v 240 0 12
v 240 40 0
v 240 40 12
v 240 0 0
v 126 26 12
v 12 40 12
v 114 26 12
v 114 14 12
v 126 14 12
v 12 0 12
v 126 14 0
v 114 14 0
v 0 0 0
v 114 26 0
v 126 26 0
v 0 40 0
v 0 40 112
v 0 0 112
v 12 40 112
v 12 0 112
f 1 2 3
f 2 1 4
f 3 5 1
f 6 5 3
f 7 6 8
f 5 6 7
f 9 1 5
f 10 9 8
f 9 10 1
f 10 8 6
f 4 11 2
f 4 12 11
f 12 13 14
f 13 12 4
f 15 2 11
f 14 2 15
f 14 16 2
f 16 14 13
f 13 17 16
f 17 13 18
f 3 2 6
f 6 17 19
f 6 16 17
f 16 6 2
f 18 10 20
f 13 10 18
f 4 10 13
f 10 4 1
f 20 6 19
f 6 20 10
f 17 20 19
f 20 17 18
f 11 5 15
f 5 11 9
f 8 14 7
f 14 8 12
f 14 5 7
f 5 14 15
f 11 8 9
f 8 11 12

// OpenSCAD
$fn = 32;

// ----------------------------------------------------------------------
// Gantry bracket: 200-250 mm L bracket
// ----------------------------------------------------------------------

// --- parameters (mm) ---
base_l = 240;             // base arm length, X
arm_w = 40;               // arm width, Y
thick = 12;               // arm thickness
up_h = 100;               // vertical arm height, Z
slot_w = 12;              // adjustment slot width in the base

total_h = up_h + thick;  // overall height

difference() {
  union() {
    cube([base_l, arm_w, thick]);
    cube([thick, arm_w, total_h]);
  }
  translate([base_l / 2 - slot_w / 2, arm_w / 2 - slot_w / 2, -1])
    cube([slot_w, slot_w, thick + 2]);
}
